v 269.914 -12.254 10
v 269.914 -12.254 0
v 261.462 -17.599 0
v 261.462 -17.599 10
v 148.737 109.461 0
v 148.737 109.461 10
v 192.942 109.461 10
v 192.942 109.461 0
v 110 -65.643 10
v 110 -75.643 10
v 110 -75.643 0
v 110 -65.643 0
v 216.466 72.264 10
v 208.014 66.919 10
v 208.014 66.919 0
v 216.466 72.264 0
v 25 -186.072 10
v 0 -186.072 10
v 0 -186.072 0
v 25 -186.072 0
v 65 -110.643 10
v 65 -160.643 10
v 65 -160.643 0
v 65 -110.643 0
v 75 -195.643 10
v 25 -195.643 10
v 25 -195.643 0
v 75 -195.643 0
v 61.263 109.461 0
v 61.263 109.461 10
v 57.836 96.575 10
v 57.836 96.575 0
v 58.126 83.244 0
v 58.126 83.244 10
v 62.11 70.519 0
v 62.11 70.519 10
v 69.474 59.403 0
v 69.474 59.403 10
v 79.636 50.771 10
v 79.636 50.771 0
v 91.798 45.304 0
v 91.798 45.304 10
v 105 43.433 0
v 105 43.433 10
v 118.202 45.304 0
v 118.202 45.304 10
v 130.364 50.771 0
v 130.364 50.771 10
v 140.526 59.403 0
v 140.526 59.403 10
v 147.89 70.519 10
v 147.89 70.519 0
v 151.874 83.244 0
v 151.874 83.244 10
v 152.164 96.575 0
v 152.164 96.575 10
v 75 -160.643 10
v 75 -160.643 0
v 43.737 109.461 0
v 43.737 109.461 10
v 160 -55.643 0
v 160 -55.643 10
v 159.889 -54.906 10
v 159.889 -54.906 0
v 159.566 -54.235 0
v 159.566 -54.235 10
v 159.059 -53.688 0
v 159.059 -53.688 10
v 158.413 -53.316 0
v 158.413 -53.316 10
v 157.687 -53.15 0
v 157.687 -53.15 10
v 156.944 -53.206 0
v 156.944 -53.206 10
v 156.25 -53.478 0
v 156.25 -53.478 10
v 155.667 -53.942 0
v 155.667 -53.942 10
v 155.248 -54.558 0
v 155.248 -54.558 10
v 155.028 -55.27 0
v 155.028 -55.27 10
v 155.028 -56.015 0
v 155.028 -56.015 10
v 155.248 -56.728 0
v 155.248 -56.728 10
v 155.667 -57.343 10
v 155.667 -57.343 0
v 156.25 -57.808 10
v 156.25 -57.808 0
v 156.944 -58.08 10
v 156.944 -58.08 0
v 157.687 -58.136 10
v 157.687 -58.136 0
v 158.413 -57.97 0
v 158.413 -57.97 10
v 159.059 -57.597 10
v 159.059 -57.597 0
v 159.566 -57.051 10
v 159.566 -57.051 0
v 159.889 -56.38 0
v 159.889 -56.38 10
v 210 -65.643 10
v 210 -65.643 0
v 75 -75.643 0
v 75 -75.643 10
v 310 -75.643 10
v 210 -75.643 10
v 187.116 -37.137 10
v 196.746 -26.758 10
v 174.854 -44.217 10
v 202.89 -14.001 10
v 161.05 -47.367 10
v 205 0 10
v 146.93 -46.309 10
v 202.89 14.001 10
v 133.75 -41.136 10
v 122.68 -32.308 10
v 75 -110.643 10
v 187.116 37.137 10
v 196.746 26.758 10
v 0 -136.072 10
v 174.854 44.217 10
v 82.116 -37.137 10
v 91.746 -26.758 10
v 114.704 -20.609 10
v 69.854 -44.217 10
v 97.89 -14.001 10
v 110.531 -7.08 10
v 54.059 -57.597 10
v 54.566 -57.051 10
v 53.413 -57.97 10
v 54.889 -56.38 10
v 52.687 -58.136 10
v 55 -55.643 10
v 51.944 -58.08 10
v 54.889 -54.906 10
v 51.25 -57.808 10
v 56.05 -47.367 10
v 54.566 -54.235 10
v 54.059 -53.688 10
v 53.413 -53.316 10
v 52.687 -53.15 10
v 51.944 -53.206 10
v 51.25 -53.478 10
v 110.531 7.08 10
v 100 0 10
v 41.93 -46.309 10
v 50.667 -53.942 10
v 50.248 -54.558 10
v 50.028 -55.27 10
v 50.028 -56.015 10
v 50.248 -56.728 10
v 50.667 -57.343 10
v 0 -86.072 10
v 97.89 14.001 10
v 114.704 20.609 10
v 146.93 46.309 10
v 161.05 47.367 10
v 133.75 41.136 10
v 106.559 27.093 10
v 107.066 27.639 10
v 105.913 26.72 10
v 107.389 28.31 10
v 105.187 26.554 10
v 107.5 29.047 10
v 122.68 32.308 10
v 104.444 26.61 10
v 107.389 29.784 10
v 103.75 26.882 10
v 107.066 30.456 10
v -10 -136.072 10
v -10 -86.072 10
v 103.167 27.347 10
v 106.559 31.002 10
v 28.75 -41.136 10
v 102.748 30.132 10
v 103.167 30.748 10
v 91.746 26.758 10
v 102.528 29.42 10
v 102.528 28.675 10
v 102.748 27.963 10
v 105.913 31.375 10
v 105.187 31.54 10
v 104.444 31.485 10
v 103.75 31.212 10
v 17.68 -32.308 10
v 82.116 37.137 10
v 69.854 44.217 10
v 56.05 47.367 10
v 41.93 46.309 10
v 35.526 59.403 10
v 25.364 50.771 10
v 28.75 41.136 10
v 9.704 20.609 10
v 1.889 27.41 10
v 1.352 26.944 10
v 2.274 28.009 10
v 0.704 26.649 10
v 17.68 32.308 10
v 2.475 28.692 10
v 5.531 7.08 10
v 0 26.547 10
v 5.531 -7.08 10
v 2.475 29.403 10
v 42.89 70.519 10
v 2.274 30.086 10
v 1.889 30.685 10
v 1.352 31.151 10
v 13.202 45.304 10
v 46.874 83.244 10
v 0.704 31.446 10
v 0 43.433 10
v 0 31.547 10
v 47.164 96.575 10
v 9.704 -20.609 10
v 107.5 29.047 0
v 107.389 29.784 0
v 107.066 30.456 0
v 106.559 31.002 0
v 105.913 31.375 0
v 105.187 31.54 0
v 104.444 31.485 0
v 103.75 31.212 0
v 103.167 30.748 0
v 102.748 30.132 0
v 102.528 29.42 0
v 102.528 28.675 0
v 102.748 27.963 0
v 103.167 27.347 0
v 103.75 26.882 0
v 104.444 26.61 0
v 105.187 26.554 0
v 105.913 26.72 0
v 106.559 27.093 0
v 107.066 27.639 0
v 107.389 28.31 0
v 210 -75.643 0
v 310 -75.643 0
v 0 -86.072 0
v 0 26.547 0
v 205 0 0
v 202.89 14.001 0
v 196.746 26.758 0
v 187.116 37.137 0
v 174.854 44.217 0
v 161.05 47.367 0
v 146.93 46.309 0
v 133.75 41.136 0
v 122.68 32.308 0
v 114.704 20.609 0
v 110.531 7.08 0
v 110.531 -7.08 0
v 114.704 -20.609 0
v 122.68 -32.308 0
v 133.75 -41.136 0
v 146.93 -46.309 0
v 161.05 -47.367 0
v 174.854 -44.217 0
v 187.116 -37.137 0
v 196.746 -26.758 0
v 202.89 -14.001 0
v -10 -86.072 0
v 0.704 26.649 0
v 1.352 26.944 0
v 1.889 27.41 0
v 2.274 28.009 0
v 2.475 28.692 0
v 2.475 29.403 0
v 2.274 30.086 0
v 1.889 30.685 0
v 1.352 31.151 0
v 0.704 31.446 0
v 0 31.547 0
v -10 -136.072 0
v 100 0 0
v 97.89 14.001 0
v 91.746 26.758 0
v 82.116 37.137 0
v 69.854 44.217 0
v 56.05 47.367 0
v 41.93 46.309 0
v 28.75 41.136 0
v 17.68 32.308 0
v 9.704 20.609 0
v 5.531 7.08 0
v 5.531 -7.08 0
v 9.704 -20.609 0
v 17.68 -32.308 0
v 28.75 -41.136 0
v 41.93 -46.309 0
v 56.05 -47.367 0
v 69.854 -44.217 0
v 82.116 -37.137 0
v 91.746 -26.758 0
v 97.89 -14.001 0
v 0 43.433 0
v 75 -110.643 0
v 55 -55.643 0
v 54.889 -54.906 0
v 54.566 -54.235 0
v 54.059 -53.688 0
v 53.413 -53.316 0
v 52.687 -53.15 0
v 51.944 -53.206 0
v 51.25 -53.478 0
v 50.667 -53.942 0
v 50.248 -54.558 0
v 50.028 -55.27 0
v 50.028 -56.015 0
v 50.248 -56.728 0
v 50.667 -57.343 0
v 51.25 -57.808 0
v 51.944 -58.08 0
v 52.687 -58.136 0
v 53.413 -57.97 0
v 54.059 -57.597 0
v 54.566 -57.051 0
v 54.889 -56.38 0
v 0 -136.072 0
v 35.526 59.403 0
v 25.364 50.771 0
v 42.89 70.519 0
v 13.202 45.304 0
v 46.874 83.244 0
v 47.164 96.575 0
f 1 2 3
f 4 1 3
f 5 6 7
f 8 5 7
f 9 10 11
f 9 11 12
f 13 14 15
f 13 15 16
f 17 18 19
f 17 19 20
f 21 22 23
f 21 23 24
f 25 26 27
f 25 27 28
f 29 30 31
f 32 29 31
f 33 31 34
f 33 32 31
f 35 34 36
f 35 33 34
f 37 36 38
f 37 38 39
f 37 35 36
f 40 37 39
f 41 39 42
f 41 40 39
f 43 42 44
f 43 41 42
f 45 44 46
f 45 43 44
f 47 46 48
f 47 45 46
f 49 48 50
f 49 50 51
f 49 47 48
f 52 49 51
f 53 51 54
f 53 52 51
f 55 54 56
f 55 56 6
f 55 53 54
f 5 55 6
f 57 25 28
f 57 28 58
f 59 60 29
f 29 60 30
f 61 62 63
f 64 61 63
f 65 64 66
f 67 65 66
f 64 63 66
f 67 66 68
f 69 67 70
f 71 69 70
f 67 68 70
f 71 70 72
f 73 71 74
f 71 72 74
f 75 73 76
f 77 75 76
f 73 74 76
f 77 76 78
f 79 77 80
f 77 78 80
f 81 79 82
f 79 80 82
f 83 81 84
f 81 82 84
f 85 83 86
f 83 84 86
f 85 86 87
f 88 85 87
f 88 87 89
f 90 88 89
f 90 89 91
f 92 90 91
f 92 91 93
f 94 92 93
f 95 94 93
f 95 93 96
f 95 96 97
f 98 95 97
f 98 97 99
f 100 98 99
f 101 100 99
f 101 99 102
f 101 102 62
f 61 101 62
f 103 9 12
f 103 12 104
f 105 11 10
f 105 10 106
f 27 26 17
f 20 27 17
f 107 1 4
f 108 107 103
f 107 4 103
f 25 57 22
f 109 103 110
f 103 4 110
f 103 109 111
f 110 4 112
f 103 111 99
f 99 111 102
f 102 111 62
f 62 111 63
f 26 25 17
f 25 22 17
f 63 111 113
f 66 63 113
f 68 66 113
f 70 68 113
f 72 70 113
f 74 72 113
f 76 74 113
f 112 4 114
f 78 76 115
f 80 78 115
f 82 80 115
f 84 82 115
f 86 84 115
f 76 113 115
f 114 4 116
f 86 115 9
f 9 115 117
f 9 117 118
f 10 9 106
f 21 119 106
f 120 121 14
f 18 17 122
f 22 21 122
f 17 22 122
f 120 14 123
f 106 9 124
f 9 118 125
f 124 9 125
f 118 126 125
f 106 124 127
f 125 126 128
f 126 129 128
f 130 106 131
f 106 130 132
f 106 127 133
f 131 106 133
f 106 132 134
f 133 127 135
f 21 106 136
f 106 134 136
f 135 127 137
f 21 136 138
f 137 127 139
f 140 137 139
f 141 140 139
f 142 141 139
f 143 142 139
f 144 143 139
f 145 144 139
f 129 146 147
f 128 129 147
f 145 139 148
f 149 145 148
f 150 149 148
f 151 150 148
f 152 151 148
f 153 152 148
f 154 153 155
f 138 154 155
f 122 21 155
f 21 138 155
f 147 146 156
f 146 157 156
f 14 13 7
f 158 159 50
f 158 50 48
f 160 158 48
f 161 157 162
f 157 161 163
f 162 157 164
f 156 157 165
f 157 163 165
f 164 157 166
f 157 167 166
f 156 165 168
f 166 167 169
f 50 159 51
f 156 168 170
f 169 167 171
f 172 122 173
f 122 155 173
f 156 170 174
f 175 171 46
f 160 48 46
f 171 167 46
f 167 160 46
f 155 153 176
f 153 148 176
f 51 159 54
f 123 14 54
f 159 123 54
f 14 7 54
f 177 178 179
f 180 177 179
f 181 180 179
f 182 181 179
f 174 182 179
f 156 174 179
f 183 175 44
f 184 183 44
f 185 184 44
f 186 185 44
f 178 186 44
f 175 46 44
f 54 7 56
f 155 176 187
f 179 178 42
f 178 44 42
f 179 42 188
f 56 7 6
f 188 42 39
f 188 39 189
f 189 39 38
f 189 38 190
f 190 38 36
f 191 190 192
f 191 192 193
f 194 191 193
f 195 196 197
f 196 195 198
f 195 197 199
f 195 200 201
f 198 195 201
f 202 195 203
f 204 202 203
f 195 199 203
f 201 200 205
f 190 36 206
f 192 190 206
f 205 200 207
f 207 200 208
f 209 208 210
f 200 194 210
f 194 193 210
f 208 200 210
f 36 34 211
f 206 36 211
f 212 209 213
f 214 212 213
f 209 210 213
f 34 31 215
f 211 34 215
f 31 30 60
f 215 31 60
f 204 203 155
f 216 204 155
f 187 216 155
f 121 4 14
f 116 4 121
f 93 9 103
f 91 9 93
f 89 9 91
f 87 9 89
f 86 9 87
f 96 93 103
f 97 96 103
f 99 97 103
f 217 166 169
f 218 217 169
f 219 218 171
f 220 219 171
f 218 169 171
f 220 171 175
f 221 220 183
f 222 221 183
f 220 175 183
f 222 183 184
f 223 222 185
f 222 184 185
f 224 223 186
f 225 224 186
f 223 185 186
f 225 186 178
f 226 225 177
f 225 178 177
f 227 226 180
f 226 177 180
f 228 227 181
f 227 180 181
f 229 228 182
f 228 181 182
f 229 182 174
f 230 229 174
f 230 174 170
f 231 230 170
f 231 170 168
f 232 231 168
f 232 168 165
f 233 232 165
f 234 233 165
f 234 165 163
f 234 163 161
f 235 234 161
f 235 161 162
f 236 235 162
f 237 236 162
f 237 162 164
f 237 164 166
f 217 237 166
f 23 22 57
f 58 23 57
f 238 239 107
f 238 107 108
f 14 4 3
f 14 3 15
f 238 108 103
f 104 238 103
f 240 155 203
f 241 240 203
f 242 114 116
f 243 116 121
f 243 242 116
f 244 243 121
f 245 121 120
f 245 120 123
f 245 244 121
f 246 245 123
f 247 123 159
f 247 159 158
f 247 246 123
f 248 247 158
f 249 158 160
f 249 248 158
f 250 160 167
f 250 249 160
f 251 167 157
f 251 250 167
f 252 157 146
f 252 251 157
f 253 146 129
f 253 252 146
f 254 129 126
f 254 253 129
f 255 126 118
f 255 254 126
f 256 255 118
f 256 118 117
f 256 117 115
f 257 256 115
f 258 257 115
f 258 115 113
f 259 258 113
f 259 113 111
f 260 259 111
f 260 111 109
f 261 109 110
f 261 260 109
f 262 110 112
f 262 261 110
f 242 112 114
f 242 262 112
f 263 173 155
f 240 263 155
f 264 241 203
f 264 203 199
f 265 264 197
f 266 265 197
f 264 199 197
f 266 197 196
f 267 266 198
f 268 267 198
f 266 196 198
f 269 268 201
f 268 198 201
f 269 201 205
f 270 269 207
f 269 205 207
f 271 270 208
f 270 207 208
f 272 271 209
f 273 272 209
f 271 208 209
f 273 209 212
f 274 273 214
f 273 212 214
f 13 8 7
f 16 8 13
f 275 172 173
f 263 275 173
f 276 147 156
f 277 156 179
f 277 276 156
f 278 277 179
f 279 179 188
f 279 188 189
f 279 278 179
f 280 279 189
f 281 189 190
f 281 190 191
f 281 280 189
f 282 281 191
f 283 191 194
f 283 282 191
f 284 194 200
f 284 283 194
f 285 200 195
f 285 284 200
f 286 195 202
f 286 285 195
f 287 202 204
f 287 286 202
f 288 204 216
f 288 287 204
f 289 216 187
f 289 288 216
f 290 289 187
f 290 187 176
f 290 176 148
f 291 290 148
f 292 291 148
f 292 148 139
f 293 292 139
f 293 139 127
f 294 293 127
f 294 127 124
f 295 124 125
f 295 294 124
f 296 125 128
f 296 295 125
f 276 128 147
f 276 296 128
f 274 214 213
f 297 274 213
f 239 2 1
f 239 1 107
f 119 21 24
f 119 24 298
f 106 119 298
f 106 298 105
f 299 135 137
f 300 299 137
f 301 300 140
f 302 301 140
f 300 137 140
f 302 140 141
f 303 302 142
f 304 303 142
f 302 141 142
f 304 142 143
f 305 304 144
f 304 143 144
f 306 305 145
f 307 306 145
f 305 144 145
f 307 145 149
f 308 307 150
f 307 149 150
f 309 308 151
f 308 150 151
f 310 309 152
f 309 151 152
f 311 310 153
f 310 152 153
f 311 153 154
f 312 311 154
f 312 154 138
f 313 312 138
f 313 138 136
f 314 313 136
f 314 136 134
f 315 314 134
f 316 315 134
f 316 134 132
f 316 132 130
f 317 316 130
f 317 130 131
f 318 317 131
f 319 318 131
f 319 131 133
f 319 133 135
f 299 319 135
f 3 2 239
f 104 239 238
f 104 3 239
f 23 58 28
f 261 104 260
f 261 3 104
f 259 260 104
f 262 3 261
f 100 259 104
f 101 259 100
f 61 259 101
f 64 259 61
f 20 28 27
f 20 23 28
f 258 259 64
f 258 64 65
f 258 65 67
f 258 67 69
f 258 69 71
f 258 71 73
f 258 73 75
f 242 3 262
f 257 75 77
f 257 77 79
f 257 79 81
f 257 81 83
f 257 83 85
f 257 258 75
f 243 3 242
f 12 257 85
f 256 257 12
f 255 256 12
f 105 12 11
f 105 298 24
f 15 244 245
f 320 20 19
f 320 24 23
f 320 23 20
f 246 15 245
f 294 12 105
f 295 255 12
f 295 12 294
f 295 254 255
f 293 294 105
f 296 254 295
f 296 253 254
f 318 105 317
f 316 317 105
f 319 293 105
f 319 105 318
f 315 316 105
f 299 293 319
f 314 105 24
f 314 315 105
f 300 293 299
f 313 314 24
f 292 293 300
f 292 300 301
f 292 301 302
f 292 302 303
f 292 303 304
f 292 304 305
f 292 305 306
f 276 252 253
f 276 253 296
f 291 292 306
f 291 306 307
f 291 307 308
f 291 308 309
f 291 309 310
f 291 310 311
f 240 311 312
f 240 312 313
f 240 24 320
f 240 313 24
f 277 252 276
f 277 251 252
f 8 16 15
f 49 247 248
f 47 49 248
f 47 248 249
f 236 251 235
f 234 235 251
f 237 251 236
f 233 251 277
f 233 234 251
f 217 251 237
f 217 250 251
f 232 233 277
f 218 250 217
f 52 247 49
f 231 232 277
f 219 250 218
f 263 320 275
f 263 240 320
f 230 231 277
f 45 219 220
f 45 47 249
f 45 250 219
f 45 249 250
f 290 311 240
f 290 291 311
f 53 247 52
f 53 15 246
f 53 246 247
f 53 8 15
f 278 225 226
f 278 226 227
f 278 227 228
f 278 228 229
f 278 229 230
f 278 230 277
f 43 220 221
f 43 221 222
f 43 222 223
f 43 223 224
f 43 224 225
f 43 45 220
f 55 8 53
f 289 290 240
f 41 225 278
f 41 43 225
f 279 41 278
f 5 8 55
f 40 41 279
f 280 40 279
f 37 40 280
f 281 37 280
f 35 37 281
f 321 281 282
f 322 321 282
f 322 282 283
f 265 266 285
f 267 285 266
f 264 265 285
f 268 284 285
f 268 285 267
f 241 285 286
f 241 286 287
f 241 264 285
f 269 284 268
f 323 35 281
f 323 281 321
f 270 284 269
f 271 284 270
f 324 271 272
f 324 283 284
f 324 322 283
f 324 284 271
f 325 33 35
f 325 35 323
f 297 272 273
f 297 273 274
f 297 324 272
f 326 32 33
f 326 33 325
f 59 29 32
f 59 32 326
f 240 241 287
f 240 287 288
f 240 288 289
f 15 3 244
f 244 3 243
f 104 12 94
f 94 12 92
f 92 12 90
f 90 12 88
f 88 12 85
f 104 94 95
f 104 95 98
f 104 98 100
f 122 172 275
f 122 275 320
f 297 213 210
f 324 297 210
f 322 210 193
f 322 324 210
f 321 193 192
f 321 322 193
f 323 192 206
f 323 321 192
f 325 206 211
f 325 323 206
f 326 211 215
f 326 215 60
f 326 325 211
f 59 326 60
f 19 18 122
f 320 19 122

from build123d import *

# Parameters (mm, degrees)
ESQUISSE1_R             = 47.5
BOSS_EXTRU_1_DEPTH      = 10
ESQUISSE3_W             = 100
ESQUISSE3_H             = 10
ENL_V_MAT_EXTRU_1_DEPTH = 11
ESQUISSE4_R             = 2.5
ENL_V_MAT_EXTRU_2_DEPTH = 11
ESQUISSE6_W             = 150
ESQUISSE6_H             = 120
BOSS_EXTRU_2_DEPTH      = 10
ESQUISSE7_W             = 10
ESQUISSE7_H             = 50
ESQUISSE7_W_2           = 50
ESQUISSE7_H_2           = 9.570800355
ENL_V_MAT_EXTRU_3_DEPTH = 10
ENL_V_MAT_EXTRU_4_DEPTH = 10
ESQUISSE9_W             = 10
ESQUISSE9_H             = 50
BOSS_EXTRU_3_DEPTH      = 10


with BuildPart() as part:
    # Esquisse1 → Boss.-Extru.1 (new body)
    with BuildSketch(Plane.XY):
        Polygon((-310, -75.642859016), (0, 414.561180135), (310, -75.642859016), align=None)
        with Locations((-157.5, 0)):
            Circle(ESQUISSE1_R, mode=Mode.SUBTRACT)
        with Locations((-52.5, 0)):
            Circle(ESQUISSE1_R, mode=Mode.SUBTRACT)
        with Locations((52.5, 0)):
            Circle(ESQUISSE1_R, mode=Mode.SUBTRACT)
        with Locations((157.5, 0)):
            Circle(ESQUISSE1_R, mode=Mode.SUBTRACT)
        with Locations((-105, 90.932667397)):
            Circle(ESQUISSE1_R, mode=Mode.SUBTRACT)
        with Locations((0, 90.932667397)):
            Circle(ESQUISSE1_R, mode=Mode.SUBTRACT)
        with Locations((105, 90.932667397)):
            Circle(ESQUISSE1_R, mode=Mode.SUBTRACT)
        with Locations((-52.5, 181.865334795)):
            Circle(ESQUISSE1_R, mode=Mode.SUBTRACT)
        with Locations((52.5, 181.865334795)):
            Circle(ESQUISSE1_R, mode=Mode.SUBTRACT)
        with Locations((0, 272.798002192)):
            Circle(ESQUISSE1_R, mode=Mode.SUBTRACT)
    extrude(amount=BOSS_EXTRU_1_DEPTH)

    # Esquisse3 → Enlèv. mat.-Extru.1 (cut, through all)
    with BuildSketch(Plane.XY.offset(10)):
        Polygon((-269.913793103, -12.254405678), (-261.461999325, -17.599233264), (-208.013723463, 66.918704521), (-216.465517241, 72.263532107), align=None)
        Polygon((-181.724137931, 127.200191667), (-173.272344153, 121.855364081), (-119.82406829, 206.373301865), (-128.275862069, 211.718129452), align=None)
        Polygon((-93.534482759, 266.654789012), (-85.08268898, 261.309961425), (-31.634413118, 345.82789921), (-40.086206897, 351.172726796), align=None)
        Polygon((269.913793103, -12.254405678), (261.461999325, -17.599233264), (208.013723463, 66.918704521), (216.465517241, 72.263532107), align=None)
        Polygon((181.724137931, 127.200191667), (173.272344153, 121.855364081), (119.82406829, 206.373301865), (128.275862069, 211.718129452), align=None)
        Polygon((93.534482759, 266.654789012), (85.08268898, 261.309961425), (31.634413118, 345.82789921), (40.086206897, 351.172726796), align=None)
        with Locations((-160, -70.642859016)):
            Rectangle(ESQUISSE3_W, ESQUISSE3_H)
        with Locations((160, -70.642859016)):
            Rectangle(ESQUISSE3_W, ESQUISSE3_H)
    extrude(amount=-ENL_V_MAT_EXTRU_1_DEPTH, mode=Mode.SUBTRACT)

    # Esquisse4 → Enlèv. mat.-Extru.2 (cut, through all)
    with BuildSketch(Plane.XY.offset(10)):
        with Locations((-157.5, -55.642859016)):
            Circle(ESQUISSE4_R)
        with Locations((-52.5, -55.642859016)):
            Circle(ESQUISSE4_R)
        with Locations((52.5, -55.642859016)):
            Circle(ESQUISSE4_R)
        with Locations((157.5, -55.642859016)):
            Circle(ESQUISSE4_R)
        with Locations((-105, 29.047375097)):
            Circle(ESQUISSE4_R)
        with Locations((0, 29.047375097)):
            Circle(ESQUISSE4_R)
        with Locations((105, 29.047375097)):
            Circle(ESQUISSE4_R)
        with Locations((-52.5, 119.980042494)):
            Circle(ESQUISSE4_R)
        with Locations((52.5, 119.980042494)):
            Circle(ESQUISSE4_R)
        with Locations((0, 210.912709891)):
            Circle(ESQUISSE4_R)
    extrude(amount=-ENL_V_MAT_EXTRU_2_DEPTH, mode=Mode.SUBTRACT)

    # Esquisse6 → Boss.-Extru.2 (add)
    with BuildSketch(Plane.XY.offset(10)):
        with Locations((0, -135.642859016)):
            Rectangle(ESQUISSE6_W, ESQUISSE6_H)
    extrude(amount=-BOSS_EXTRU_2_DEPTH)

    # Esquisse7 → Enlèv. mat.-Extru.3 (cut)
    with BuildSketch(Plane.XY.offset(10)):
        with Locations((-70, -135.642859016)):
            Rectangle(ESQUISSE7_W, ESQUISSE7_H)
        with Locations((0, -190.857458839)):
            Rectangle(ESQUISSE7_W_2, ESQUISSE7_H_2)
        with Locations((70, -135.642859016)):
            Rectangle(ESQUISSE7_W, ESQUISSE7_H)
    extrude(amount=-ENL_V_MAT_EXTRU_3_DEPTH, mode=Mode.SUBTRACT)

    # Esquisse8 → Enlèv. mat.-Extru.4 (cut)
    with BuildSketch(Plane.XY.offset(10)):
        Polygon((0, -217.346828515), (0, 109.461180135), (292.569272736, 109.461180135), (292.569272736, 414.561180135), (0, 414.561180135), (-356.657737224, 414.561180135), (-356.657737224, -217.346828515), align=None)
    extrude(amount=-ENL_V_MAT_EXTRU_4_DEPTH, mode=Mode.SUBTRACT)

    # Esquisse9 → Boss.-Extru.3 (add)
    with BuildSketch(Plane.XY.offset(10)):
        with Locations((-5, -111.072058661)):
            Rectangle(ESQUISSE9_W, ESQUISSE9_H)
    extrude(amount=-BOSS_EXTRU_3_DEPTH)


solid = part.part
